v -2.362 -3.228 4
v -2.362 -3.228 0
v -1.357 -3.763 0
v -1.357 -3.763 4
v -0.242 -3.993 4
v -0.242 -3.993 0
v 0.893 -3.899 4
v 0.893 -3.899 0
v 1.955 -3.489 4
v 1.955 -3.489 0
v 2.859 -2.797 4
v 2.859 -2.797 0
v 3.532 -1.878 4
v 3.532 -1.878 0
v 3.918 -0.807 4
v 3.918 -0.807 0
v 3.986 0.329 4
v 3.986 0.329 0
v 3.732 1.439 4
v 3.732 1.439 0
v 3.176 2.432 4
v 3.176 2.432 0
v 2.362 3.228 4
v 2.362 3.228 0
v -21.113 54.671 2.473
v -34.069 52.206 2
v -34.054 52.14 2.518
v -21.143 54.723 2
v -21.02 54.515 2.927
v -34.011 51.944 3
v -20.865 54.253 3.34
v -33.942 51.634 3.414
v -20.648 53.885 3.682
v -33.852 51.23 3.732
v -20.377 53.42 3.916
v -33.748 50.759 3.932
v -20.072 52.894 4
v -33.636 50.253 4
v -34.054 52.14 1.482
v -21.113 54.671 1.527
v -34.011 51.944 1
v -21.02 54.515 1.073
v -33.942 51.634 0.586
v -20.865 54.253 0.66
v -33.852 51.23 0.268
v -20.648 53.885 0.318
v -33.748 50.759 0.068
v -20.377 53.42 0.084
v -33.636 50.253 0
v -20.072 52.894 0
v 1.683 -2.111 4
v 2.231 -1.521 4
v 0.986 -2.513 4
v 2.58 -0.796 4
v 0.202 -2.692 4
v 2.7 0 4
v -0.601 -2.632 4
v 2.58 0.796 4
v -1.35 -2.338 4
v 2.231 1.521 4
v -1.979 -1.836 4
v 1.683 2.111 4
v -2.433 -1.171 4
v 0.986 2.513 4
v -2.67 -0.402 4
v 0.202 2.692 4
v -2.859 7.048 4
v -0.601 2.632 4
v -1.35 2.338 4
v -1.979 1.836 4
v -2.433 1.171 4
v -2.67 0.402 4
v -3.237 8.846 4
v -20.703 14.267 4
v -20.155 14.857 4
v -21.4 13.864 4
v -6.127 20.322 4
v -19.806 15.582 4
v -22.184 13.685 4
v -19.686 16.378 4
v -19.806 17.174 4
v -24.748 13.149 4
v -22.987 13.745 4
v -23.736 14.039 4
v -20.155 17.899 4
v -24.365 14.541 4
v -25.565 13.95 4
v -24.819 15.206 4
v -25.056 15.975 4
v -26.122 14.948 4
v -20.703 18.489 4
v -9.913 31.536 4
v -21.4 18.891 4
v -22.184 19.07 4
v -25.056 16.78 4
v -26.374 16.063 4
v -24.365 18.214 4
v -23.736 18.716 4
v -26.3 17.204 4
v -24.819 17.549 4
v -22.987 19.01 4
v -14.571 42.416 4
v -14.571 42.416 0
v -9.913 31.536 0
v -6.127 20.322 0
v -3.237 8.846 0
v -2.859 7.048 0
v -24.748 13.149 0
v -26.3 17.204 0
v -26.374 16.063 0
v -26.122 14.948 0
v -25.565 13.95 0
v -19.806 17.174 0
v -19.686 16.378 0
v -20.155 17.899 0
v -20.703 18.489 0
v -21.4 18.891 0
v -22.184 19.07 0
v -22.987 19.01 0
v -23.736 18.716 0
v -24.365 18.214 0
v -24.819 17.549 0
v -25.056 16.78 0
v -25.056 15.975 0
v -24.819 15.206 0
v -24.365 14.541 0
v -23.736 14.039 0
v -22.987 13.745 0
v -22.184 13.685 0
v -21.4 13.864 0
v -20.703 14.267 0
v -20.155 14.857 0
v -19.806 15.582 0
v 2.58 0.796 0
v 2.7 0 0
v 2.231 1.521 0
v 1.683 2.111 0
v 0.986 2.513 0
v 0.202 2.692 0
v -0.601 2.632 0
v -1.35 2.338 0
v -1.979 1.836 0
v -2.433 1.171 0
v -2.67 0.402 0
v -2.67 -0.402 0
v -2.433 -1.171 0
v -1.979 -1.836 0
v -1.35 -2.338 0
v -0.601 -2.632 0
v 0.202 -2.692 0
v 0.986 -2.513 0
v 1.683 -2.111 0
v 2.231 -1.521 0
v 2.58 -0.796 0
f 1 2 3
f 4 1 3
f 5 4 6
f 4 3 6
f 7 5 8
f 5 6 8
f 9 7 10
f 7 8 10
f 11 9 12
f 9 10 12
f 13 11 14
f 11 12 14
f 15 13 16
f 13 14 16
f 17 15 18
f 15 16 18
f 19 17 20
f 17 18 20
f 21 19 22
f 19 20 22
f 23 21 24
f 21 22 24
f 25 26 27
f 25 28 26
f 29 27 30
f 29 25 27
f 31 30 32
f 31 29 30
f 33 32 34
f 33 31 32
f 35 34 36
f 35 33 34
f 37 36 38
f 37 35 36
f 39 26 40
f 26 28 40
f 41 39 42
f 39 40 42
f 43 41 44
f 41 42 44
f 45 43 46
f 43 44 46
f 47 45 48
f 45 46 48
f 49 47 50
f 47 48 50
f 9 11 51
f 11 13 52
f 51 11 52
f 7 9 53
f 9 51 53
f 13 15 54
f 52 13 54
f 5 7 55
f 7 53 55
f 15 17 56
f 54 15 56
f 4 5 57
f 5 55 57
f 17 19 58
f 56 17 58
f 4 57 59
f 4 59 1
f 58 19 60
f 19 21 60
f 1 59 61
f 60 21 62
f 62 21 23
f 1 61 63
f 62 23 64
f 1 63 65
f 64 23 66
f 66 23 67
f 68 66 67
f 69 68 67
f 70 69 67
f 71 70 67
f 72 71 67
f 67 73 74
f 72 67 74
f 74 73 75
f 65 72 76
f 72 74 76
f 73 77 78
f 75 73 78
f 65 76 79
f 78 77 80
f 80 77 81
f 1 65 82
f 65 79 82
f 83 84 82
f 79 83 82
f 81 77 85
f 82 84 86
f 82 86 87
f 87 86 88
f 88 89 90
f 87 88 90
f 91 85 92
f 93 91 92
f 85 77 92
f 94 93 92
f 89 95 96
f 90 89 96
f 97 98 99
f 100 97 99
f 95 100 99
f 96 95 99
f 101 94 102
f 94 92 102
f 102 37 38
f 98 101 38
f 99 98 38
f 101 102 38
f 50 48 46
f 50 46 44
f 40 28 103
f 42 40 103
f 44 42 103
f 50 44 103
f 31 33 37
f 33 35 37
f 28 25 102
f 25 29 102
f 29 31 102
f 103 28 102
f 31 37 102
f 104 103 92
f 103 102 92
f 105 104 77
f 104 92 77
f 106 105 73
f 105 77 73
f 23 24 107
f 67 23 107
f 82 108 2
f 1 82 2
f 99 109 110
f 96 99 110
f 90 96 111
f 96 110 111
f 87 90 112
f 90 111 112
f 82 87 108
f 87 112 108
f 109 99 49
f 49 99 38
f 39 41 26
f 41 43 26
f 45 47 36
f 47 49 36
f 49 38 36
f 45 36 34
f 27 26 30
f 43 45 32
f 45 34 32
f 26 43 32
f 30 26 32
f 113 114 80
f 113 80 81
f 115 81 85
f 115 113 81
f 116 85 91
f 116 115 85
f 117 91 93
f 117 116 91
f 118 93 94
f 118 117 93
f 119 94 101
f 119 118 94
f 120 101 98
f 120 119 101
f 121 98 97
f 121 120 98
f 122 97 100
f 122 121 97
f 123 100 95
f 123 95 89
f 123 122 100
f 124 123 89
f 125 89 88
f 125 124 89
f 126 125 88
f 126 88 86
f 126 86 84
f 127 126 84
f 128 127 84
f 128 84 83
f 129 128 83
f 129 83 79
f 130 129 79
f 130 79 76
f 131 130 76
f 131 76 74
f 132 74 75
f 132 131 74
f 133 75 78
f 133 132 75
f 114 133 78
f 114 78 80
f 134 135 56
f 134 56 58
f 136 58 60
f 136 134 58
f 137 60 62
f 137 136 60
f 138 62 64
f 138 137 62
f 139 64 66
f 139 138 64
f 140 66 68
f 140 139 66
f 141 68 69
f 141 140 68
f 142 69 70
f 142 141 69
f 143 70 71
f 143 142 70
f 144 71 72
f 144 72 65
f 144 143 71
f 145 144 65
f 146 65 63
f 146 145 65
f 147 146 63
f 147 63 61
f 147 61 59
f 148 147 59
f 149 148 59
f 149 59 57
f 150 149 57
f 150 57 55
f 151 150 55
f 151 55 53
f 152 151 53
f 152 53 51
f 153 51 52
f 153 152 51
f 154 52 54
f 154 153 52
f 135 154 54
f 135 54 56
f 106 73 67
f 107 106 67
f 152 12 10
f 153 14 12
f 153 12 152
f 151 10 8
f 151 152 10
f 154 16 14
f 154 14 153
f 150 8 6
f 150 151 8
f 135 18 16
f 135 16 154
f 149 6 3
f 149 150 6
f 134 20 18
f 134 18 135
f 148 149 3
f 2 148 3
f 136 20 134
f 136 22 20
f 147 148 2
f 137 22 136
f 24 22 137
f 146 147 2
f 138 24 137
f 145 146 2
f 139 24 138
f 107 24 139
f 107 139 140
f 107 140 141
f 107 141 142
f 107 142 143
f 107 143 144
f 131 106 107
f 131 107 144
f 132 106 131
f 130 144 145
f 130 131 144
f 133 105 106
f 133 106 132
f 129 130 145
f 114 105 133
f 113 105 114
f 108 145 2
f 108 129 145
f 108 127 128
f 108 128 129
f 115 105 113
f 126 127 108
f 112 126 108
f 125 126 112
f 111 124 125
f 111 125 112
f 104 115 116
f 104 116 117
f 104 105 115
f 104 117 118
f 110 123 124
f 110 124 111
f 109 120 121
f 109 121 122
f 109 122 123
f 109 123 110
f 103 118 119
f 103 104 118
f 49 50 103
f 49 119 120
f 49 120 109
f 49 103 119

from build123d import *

# Parameters (mm, degrees)
SKETCH1_R           = 2.7
BOSS_EXTRUDE1_DEPTH = 4
BOSS_EXTRUDE2_DEPTH = 4
FILLET4_R           = 150
FILLET5_R           = 2


# Some blends are built 0.0001 mm under size
with BuildPart() as part:
    # Sketch1 → Boss-Extrude1 (new body)
    with BuildSketch(Plane.XY):
        with BuildLine():
            Line((-24.747899147, 13.14945447), (-2.361821958, -3.228280818))
            ThreePointArc((-2.361821958, -3.228280818), (3.228280818, -2.361821958), (2.361821958, 3.228280818))
            Line((2.361821958, 3.228280818), (-20.024255231, 19.606016105))
            ThreePointArc((-20.024255231, 19.606016105), (-25.614358007, 18.739557246), (-24.747899147, 13.14945447))
        make_face()
        Circle(SKETCH1_R, mode=Mode.SUBTRACT)
        with Locations((-22.386077189, 16.377735287)):
            Circle(SKETCH1_R, mode=Mode.SUBTRACT)
    extrude(amount=BOSS_EXTRUDE1_DEPTH)

    # Sketch2 → Boss-Extrude2 (add, through all)
    with BuildSketch(Plane.XY.offset(4)):
        with BuildLine():
            Line((-26.299706155, 17.204480908), (-34.069064165, 52.206086792))
            Line((-34.069064165, 52.206086792), (-21.14349971, 54.723244673))
            Line((-21.14349971, 54.723244673), (-13.231740333, 56.386597335))
            Line((-13.231740333, 56.386597335), (-2.8588348, 7.047732243))
            Line((-2.8588348, 7.047732243), (-13.354395565, 14.726322576))
            Line((-13.354395565, 14.726322576), (-20.024255231, 19.606016105))
            ThreePointArc((-20.024255231, 19.606016105), (-23.81571668, 20.113525823), (-26.299706155, 17.204480908))
        make_face()
    extrude(amount=-BOSS_EXTRUDE2_DEPTH)

    # Fillet4
    # the kernel refuses this fillet: 150 mm, written as the material it takes off along each edge
    with BuildSketch(Plane(origin=(-13.231740333, 56.386597335, 125.450940965), x_dir=(0.20574032293470337, -0.9786066214361745, 0), z_dir=(0, 0, -1))) as fillet4_piece_1:
        with BuildLine():
            CenterArc((48.580376386, 150), FILLET4_R, 251.102921571, 18.897078429)
            Line((0, 8.084718828), (0, 0))
            Line((0, 0), (48.580376386, 0))
        make_face()
    extrude(amount=246.90188193, mode=Mode.SUBTRACT)

    # Fillet5
    fillet5_edges = [part.edges().sort_by_distance(p)[0] for p in [
        (-27.606281937, 53.464665733, 4),
        (-27.606281937, 53.464665733, 0),
    ]]
    fillet(fillet5_edges, radius=FILLET5_R - 0.0001)  # a hair under: the kernel refuses the full size


solid = part.part
